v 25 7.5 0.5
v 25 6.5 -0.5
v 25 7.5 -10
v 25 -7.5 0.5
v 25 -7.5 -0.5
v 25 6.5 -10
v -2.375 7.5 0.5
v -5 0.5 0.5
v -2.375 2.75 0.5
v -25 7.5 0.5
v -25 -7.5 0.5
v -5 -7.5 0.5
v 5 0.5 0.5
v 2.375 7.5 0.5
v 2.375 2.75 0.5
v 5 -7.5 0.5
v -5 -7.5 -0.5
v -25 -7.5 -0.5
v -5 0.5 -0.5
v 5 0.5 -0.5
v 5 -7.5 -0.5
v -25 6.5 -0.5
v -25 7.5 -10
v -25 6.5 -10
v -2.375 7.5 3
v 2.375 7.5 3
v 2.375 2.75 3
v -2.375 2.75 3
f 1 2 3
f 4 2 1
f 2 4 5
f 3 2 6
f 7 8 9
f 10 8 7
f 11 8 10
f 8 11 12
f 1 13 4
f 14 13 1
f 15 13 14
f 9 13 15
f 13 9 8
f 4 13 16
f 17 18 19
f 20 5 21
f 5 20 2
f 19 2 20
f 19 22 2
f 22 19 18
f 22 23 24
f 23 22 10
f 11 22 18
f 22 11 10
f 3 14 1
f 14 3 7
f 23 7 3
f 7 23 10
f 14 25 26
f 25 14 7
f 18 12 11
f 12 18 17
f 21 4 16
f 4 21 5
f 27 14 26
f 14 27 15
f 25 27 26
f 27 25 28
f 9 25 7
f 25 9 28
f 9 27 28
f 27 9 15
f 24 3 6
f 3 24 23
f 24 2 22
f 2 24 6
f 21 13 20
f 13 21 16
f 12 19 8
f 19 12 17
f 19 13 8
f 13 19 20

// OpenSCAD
PLATE_THICKNESS = 1;
PLATE_LENGTH = 50;
PLATE_WIDTH = 15;

TOP_PLATE = true;
TOP_PLATE_HEIGHT = 10;

NOB_SIZE = 4.75;
NOB_LIP_SIZE = NOB_SIZE;
NOB_LIP_THICKNESS = 0;
NOB_LENGTH = 2.5;

CHAIN_EXCLUSION_WIDTH = NOB_LIP_SIZE != NOB_SIZE ? PLATE_WIDTH - NOB_LIP_SIZE : 8;
CHAIN_EXCLUSION_LENGTH = 10;

module plate() {
  difference() {
    union() {
      cube(size = [PLATE_LENGTH, PLATE_WIDTH, PLATE_THICKNESS], center = true);
      translate([0, (PLATE_WIDTH - NOB_LIP_SIZE)/2, PLATE_THICKNESS/2]) {
        translate([0, 0, NOB_LIP_THICKNESS/2])
        cube(size = [NOB_LIP_SIZE, NOB_LIP_SIZE, NOB_LIP_THICKNESS], center = true);

        translate([0, 0, NOB_LENGTH/2])
        cube(size = [NOB_SIZE, NOB_SIZE, NOB_LENGTH], center = true);
      }
      
      if(TOP_PLATE) {
        translate([0, (PLATE_WIDTH - PLATE_THICKNESS)/2, -TOP_PLATE_HEIGHT/2])
        cube(size = [PLATE_LENGTH, PLATE_THICKNESS, TOP_PLATE_HEIGHT], center = true);
      }
    }
    
    #translate([0, -(PLATE_WIDTH - CHAIN_EXCLUSION_WIDTH)/2, 0])
    cube(size = [CHAIN_EXCLUSION_LENGTH, CHAIN_EXCLUSION_WIDTH, PLATE_THICKNESS], center = true);
  }
}

plate();
